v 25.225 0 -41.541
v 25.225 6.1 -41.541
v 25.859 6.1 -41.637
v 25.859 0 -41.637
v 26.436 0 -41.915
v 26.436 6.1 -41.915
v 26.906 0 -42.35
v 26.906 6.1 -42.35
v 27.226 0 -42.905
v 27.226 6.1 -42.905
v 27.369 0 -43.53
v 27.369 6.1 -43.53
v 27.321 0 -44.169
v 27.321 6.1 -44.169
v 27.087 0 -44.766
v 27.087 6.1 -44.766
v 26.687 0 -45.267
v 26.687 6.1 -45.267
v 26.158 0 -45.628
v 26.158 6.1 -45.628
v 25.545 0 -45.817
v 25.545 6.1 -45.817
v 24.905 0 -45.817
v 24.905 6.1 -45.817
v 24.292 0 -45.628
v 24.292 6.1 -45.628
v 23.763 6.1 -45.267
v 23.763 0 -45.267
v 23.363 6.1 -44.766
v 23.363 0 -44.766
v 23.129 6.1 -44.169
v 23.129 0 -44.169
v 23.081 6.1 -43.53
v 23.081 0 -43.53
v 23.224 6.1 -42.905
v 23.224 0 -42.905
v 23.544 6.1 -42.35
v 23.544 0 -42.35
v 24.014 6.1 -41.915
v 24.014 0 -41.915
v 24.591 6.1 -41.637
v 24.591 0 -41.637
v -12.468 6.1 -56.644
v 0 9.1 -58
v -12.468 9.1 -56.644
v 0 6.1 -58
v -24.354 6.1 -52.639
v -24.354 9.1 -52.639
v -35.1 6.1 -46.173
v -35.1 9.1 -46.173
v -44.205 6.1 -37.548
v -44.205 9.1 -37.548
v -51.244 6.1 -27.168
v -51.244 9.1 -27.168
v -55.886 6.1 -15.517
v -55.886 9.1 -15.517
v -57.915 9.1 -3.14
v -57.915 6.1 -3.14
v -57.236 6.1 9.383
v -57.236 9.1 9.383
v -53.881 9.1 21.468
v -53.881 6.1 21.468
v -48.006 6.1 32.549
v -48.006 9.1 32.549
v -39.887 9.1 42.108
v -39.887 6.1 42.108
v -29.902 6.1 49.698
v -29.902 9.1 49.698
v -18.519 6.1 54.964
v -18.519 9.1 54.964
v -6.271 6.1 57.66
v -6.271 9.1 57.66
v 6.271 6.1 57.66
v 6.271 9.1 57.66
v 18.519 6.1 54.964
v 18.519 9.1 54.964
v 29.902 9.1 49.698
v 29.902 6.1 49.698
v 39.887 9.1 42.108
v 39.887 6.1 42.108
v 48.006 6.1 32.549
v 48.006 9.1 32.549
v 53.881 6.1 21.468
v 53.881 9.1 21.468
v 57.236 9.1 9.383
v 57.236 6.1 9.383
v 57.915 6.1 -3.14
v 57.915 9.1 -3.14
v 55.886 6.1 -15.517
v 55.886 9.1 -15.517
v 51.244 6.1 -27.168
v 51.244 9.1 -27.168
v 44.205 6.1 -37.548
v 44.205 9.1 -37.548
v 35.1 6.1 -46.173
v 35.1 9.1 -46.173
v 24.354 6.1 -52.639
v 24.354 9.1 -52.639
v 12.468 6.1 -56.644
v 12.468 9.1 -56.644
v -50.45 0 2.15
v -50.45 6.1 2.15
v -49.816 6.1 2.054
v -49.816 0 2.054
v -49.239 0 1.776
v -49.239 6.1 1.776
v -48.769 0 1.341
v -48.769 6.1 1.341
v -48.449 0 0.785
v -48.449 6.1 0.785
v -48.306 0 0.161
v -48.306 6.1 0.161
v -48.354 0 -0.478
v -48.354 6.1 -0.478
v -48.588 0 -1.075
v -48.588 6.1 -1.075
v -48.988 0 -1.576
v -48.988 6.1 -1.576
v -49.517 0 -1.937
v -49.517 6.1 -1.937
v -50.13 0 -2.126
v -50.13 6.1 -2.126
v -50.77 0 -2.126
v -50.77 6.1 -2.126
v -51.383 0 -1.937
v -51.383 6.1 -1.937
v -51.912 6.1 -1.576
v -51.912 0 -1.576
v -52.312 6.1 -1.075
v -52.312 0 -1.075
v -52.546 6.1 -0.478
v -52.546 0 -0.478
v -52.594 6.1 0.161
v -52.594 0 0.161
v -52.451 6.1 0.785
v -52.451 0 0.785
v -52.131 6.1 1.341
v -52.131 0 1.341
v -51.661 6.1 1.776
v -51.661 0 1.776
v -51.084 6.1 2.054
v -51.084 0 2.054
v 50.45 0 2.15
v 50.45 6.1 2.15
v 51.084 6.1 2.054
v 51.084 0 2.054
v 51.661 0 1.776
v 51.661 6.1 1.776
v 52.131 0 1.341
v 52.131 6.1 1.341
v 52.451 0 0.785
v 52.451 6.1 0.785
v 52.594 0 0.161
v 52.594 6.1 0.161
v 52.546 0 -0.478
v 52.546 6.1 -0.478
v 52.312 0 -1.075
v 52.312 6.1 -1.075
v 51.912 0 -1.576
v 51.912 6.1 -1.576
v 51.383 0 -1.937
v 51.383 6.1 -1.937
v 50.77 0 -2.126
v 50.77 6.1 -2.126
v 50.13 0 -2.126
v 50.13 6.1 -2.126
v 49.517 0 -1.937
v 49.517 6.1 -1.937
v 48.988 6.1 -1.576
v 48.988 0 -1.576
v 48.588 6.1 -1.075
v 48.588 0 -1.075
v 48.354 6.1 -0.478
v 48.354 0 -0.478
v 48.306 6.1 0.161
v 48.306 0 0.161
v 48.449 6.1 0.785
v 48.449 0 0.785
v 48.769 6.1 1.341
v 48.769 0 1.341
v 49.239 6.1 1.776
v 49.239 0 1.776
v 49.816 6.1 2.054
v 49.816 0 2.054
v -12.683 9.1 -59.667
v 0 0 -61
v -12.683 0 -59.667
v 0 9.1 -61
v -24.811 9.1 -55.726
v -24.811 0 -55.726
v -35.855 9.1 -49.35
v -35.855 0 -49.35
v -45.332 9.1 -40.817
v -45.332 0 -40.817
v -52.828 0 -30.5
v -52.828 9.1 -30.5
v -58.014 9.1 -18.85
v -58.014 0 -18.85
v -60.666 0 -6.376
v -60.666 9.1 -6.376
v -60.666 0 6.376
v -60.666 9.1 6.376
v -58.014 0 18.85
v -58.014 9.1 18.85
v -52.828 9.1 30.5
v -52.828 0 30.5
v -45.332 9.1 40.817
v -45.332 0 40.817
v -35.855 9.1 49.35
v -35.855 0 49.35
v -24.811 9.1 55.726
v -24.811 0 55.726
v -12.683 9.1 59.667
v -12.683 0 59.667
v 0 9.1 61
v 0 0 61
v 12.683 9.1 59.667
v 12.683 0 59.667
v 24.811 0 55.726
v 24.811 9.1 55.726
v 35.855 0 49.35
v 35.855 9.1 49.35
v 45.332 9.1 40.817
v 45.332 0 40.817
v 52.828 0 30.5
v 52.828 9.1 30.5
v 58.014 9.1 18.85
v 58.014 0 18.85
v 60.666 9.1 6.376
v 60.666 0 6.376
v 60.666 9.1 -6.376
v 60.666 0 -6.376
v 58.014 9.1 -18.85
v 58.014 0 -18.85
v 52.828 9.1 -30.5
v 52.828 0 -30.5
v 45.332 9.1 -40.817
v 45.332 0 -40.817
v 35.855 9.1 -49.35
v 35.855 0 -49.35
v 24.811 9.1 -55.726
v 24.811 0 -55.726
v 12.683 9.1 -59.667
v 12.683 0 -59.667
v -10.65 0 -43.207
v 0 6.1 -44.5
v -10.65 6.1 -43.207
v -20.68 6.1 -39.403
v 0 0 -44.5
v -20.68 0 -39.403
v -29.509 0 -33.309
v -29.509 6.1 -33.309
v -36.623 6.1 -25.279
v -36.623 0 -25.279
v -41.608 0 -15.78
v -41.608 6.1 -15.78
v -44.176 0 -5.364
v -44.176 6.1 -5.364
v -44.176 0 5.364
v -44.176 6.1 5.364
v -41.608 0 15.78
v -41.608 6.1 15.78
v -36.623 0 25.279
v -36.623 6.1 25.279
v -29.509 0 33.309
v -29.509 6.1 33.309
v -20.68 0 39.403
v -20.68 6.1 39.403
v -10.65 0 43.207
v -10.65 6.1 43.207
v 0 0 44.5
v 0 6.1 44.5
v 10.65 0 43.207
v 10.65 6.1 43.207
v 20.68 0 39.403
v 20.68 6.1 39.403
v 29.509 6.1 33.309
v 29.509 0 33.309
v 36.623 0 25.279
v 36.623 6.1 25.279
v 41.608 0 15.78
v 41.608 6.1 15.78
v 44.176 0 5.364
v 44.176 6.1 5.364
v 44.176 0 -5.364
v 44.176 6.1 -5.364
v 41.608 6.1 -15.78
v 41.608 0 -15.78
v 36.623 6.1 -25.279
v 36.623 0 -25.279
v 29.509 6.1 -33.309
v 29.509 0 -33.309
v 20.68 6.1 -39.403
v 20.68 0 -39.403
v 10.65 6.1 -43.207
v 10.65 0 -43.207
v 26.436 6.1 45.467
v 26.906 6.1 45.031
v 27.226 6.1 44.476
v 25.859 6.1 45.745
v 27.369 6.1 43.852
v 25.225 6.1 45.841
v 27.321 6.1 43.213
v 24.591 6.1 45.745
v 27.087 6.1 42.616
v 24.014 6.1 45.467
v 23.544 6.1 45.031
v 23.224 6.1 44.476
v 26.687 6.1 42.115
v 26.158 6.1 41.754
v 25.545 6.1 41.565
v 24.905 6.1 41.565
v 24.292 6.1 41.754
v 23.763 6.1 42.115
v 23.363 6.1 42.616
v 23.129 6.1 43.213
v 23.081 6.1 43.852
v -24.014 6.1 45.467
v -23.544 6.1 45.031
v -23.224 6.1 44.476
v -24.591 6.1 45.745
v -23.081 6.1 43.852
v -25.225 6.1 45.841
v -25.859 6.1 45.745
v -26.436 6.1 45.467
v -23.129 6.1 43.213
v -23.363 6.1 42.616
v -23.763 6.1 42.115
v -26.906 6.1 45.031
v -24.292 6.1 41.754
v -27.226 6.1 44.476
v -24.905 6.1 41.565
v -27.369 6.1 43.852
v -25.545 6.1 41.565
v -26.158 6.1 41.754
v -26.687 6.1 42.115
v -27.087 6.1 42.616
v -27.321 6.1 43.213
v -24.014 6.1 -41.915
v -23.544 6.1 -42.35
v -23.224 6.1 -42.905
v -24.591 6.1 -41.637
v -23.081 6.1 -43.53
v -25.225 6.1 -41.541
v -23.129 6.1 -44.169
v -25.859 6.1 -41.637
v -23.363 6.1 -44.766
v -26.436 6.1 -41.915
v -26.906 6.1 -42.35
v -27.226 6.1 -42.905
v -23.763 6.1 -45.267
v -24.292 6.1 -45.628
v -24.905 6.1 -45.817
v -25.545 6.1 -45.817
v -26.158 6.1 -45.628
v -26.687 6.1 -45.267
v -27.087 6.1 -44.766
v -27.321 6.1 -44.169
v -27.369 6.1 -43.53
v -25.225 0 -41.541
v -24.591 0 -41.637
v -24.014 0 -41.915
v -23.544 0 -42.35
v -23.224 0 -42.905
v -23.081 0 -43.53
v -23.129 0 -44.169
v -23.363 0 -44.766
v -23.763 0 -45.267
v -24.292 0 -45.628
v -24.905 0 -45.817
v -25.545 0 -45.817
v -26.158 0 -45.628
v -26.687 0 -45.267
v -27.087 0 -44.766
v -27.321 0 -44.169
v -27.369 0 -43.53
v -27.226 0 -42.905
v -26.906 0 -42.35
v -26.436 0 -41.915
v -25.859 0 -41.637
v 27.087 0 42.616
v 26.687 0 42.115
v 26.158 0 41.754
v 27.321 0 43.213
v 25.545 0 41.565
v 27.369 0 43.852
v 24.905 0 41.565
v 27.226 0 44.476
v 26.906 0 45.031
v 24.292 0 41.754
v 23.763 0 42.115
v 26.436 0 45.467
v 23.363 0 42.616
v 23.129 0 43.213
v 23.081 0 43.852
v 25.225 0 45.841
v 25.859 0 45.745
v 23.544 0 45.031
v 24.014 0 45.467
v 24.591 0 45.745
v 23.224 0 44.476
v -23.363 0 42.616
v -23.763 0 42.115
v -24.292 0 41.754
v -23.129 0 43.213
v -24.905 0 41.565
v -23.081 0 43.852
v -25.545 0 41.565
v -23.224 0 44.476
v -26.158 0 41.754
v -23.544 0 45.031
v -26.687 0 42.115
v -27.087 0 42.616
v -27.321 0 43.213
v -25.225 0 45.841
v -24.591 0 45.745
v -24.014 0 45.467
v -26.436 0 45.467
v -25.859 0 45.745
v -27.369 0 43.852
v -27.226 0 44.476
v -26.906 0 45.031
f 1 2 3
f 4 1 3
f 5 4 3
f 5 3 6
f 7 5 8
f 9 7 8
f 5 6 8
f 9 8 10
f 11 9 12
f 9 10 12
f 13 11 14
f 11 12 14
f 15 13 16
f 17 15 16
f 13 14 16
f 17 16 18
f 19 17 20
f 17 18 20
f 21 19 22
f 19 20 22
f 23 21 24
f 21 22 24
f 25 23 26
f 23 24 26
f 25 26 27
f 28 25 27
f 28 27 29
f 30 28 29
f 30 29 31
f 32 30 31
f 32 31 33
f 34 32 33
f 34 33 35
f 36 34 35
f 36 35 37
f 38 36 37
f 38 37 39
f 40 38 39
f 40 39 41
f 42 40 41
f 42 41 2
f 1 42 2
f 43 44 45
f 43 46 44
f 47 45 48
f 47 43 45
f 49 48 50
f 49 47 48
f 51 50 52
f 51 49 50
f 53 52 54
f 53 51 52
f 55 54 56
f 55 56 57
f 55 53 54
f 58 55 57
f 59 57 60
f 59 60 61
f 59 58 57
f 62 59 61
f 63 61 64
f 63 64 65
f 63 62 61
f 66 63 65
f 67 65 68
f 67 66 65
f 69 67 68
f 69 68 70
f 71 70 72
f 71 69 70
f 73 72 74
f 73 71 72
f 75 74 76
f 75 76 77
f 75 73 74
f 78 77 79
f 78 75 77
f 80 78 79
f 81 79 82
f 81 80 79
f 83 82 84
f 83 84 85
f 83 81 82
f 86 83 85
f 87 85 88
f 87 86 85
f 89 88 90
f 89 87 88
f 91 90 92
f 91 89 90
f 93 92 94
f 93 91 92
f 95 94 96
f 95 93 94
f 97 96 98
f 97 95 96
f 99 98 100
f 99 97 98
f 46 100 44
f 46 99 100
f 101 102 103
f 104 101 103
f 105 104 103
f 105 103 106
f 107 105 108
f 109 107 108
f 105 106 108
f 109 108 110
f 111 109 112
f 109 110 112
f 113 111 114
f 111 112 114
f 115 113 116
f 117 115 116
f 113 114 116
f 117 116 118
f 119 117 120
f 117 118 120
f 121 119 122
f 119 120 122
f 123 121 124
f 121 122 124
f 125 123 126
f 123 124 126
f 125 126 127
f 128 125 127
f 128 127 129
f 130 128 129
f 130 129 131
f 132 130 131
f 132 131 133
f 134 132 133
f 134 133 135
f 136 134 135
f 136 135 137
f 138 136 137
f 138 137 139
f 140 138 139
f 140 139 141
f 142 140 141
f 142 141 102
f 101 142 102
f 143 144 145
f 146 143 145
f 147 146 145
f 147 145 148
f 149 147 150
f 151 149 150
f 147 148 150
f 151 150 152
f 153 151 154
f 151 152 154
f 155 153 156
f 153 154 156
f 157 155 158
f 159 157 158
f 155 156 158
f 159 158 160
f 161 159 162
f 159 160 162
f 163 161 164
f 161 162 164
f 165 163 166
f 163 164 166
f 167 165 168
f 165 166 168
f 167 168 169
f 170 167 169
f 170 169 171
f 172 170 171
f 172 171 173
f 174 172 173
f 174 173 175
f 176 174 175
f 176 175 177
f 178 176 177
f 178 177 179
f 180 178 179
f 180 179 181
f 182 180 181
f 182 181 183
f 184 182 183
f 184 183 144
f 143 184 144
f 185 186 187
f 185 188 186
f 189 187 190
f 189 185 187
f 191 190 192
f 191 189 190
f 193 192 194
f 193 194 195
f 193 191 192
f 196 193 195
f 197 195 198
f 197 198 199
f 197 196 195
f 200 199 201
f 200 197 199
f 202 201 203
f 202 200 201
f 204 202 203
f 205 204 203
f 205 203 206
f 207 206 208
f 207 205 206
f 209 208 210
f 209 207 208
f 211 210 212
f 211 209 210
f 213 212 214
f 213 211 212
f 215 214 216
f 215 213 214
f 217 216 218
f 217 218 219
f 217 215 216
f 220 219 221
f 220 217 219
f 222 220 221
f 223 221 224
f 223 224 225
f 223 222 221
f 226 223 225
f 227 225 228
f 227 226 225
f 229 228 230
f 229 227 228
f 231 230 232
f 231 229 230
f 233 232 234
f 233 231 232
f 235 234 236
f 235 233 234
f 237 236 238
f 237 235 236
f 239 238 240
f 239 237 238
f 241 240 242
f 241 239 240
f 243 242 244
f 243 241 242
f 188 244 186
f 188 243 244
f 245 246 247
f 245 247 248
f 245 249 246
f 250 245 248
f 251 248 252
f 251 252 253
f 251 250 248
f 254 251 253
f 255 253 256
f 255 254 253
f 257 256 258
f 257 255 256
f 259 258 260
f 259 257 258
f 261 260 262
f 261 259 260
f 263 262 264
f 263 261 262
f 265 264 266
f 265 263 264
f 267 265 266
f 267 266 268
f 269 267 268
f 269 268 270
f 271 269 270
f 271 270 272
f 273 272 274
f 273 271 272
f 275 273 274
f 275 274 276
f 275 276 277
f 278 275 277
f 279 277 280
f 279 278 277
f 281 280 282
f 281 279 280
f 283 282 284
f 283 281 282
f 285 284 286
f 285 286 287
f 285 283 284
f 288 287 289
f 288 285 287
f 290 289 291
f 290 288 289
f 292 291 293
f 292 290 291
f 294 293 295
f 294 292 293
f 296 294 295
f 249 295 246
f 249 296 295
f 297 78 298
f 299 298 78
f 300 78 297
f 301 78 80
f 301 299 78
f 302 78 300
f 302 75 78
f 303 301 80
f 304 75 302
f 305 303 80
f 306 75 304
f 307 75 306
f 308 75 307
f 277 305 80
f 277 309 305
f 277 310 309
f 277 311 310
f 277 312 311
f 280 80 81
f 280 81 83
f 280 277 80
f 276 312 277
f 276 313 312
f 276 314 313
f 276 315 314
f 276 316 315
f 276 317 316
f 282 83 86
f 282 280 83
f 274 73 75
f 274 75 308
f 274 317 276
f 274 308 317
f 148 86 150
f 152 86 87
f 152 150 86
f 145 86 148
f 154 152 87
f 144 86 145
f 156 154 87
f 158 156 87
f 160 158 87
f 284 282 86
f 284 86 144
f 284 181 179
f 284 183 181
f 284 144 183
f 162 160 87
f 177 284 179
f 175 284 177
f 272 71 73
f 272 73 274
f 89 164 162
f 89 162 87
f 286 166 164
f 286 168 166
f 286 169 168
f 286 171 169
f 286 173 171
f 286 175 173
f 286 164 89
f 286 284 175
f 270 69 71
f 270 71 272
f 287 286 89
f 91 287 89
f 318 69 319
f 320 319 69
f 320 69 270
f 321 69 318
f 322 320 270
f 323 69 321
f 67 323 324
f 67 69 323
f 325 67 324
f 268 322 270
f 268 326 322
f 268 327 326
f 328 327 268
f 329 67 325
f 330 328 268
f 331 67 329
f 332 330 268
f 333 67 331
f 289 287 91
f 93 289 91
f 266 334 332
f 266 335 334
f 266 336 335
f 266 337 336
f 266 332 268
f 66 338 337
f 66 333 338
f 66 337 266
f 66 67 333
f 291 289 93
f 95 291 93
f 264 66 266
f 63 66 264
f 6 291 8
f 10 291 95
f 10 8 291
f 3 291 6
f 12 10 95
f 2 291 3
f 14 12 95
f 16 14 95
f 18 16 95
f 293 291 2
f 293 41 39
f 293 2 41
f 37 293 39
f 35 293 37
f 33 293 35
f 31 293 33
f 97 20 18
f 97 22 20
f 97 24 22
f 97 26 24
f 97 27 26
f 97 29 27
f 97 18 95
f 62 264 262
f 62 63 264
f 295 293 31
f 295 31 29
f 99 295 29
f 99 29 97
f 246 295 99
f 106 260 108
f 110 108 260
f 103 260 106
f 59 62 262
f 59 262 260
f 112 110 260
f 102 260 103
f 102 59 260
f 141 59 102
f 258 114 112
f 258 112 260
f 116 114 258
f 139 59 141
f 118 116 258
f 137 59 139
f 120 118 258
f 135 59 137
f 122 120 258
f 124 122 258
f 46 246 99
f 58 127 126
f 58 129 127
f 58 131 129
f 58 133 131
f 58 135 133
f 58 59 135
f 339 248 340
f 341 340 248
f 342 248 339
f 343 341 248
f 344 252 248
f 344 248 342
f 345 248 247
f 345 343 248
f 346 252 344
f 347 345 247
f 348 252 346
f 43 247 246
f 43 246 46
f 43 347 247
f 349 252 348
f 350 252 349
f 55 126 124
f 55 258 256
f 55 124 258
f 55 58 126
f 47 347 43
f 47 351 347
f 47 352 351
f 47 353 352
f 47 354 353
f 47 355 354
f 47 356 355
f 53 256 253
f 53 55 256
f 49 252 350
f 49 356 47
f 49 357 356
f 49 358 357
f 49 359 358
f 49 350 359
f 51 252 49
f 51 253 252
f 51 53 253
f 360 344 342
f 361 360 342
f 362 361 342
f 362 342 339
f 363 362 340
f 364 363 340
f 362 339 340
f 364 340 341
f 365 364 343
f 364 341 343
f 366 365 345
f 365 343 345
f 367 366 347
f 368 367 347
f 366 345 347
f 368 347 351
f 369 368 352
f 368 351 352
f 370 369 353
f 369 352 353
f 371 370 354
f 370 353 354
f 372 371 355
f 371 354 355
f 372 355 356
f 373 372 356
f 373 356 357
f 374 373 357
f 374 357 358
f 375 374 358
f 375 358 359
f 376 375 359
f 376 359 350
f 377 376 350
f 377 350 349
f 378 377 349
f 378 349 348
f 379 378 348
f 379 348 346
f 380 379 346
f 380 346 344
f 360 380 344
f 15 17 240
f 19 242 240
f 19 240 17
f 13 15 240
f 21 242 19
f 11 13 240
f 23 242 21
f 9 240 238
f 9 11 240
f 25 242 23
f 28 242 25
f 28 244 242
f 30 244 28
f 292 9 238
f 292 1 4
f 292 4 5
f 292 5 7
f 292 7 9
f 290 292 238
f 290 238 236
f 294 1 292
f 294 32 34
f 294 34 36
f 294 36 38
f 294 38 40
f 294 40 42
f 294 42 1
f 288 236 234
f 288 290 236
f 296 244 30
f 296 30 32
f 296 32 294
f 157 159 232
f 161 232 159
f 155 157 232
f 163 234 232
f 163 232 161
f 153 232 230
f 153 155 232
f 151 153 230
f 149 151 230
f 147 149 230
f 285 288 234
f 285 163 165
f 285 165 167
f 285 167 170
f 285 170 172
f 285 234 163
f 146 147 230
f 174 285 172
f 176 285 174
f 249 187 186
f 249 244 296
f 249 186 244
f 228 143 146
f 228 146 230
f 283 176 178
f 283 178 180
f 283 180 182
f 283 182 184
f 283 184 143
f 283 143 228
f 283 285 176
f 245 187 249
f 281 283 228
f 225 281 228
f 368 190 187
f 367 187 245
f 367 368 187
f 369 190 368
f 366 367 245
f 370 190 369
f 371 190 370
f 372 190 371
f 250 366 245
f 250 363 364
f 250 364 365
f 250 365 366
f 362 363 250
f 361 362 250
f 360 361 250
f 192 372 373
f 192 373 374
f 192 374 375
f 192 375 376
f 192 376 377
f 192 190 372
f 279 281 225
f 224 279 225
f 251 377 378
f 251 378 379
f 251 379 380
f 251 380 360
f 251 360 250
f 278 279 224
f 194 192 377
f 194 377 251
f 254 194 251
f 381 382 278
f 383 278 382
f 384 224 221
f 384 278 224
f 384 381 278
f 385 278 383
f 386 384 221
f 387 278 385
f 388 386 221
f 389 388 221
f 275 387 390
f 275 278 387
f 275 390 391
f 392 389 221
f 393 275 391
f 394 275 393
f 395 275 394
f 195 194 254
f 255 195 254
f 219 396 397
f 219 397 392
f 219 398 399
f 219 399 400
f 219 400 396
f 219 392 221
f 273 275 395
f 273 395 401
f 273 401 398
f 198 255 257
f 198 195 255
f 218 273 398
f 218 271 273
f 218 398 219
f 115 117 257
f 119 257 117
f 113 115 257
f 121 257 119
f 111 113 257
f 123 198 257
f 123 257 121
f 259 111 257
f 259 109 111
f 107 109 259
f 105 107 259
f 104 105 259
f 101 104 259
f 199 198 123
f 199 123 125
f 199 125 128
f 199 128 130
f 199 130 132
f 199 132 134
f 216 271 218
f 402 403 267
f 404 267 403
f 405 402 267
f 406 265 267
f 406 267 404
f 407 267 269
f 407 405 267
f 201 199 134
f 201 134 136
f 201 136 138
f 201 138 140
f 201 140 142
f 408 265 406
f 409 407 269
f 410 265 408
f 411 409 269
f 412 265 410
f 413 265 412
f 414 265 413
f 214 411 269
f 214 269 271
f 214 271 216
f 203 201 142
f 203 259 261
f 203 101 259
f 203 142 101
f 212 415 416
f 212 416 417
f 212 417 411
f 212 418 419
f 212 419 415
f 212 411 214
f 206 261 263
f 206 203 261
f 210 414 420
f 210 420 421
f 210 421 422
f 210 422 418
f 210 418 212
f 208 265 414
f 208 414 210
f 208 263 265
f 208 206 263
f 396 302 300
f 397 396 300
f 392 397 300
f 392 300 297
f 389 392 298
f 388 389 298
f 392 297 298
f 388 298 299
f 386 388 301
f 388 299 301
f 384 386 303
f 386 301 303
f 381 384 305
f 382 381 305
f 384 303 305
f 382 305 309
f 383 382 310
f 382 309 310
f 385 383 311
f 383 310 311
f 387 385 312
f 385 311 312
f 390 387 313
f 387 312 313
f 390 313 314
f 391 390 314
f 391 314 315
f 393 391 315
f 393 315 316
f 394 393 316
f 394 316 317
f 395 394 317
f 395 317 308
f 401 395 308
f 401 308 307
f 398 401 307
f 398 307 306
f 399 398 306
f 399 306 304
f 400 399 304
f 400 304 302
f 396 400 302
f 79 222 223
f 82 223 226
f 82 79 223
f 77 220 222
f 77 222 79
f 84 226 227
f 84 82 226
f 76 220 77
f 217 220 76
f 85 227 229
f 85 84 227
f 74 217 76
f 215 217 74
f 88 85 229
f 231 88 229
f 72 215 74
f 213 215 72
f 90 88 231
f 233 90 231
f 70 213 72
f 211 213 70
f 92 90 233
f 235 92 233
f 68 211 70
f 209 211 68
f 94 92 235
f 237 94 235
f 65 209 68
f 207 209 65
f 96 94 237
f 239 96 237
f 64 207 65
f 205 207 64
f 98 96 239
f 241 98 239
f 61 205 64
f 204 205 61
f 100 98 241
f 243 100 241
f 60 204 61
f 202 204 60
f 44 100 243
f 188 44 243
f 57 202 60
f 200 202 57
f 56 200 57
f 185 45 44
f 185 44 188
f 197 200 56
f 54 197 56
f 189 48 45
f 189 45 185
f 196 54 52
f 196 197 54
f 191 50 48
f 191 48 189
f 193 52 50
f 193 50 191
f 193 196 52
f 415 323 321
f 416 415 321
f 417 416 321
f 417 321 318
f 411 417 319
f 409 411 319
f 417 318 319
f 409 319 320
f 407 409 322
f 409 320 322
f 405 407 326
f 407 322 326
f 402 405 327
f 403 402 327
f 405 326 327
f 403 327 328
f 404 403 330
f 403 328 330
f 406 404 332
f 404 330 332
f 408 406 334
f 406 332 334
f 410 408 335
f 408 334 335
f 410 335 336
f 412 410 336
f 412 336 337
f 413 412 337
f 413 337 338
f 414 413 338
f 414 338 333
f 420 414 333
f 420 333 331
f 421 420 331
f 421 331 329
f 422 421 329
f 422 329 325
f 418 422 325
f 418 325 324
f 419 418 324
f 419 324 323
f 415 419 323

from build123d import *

# Parameters (mm, degrees)
SKETCH_3_R          = 2.15
CUT_EXTRUDE_2_DEPTH = 10


with BuildPart() as part:
    # 草图1 → 旋转1 (revolve)
    with BuildSketch(Plane.XY, mode=Mode.PRIVATE) as revolve_1_sk:
        Polygon((44.5, 0), (58, 0), (61, 0), (61, 9.1), (58, 9.1), (58, 6.1), (44.5, 6.1), align=None)
    revolve(revolve_1_sk.sketch.rotate(Axis((0, 0, 0), (0, 1, 0)), 90), axis=Axis((0, 0, 0), (0, 1, 0)))

    # 草图3 → 切除-拉伸2 (cut)
    with BuildSketch(Plane(origin=(0, 6.1, 0), x_dir=(1, 0, 0), z_dir=(0, 1, 0))):
        with Locations(Location((-50.45, 0, 0), (0, 0, 270))):
            Circle(SKETCH_3_R)
        with Locations(Location((-25.225, 43.690981621, 0), (0, 0, 270))):
            Circle(SKETCH_3_R)
        with Locations(Location((25.225, 43.690981621, 0), (0, 0, 270))):
            Circle(SKETCH_3_R)
        with Locations(Location((50.45, 0, 0), (0, 0, 270))):
            Circle(SKETCH_3_R)
        with Locations(Location((25.225, -43.690981621, 0), (0, 0, 270))):
            Circle(SKETCH_3_R)
        with Locations(Location((-25.225, -43.690981621, 0), (0, 0, 270))):
            Circle(SKETCH_3_R)
    extrude(amount=-CUT_EXTRUDE_2_DEPTH, mode=Mode.SUBTRACT)


solid = part.part
